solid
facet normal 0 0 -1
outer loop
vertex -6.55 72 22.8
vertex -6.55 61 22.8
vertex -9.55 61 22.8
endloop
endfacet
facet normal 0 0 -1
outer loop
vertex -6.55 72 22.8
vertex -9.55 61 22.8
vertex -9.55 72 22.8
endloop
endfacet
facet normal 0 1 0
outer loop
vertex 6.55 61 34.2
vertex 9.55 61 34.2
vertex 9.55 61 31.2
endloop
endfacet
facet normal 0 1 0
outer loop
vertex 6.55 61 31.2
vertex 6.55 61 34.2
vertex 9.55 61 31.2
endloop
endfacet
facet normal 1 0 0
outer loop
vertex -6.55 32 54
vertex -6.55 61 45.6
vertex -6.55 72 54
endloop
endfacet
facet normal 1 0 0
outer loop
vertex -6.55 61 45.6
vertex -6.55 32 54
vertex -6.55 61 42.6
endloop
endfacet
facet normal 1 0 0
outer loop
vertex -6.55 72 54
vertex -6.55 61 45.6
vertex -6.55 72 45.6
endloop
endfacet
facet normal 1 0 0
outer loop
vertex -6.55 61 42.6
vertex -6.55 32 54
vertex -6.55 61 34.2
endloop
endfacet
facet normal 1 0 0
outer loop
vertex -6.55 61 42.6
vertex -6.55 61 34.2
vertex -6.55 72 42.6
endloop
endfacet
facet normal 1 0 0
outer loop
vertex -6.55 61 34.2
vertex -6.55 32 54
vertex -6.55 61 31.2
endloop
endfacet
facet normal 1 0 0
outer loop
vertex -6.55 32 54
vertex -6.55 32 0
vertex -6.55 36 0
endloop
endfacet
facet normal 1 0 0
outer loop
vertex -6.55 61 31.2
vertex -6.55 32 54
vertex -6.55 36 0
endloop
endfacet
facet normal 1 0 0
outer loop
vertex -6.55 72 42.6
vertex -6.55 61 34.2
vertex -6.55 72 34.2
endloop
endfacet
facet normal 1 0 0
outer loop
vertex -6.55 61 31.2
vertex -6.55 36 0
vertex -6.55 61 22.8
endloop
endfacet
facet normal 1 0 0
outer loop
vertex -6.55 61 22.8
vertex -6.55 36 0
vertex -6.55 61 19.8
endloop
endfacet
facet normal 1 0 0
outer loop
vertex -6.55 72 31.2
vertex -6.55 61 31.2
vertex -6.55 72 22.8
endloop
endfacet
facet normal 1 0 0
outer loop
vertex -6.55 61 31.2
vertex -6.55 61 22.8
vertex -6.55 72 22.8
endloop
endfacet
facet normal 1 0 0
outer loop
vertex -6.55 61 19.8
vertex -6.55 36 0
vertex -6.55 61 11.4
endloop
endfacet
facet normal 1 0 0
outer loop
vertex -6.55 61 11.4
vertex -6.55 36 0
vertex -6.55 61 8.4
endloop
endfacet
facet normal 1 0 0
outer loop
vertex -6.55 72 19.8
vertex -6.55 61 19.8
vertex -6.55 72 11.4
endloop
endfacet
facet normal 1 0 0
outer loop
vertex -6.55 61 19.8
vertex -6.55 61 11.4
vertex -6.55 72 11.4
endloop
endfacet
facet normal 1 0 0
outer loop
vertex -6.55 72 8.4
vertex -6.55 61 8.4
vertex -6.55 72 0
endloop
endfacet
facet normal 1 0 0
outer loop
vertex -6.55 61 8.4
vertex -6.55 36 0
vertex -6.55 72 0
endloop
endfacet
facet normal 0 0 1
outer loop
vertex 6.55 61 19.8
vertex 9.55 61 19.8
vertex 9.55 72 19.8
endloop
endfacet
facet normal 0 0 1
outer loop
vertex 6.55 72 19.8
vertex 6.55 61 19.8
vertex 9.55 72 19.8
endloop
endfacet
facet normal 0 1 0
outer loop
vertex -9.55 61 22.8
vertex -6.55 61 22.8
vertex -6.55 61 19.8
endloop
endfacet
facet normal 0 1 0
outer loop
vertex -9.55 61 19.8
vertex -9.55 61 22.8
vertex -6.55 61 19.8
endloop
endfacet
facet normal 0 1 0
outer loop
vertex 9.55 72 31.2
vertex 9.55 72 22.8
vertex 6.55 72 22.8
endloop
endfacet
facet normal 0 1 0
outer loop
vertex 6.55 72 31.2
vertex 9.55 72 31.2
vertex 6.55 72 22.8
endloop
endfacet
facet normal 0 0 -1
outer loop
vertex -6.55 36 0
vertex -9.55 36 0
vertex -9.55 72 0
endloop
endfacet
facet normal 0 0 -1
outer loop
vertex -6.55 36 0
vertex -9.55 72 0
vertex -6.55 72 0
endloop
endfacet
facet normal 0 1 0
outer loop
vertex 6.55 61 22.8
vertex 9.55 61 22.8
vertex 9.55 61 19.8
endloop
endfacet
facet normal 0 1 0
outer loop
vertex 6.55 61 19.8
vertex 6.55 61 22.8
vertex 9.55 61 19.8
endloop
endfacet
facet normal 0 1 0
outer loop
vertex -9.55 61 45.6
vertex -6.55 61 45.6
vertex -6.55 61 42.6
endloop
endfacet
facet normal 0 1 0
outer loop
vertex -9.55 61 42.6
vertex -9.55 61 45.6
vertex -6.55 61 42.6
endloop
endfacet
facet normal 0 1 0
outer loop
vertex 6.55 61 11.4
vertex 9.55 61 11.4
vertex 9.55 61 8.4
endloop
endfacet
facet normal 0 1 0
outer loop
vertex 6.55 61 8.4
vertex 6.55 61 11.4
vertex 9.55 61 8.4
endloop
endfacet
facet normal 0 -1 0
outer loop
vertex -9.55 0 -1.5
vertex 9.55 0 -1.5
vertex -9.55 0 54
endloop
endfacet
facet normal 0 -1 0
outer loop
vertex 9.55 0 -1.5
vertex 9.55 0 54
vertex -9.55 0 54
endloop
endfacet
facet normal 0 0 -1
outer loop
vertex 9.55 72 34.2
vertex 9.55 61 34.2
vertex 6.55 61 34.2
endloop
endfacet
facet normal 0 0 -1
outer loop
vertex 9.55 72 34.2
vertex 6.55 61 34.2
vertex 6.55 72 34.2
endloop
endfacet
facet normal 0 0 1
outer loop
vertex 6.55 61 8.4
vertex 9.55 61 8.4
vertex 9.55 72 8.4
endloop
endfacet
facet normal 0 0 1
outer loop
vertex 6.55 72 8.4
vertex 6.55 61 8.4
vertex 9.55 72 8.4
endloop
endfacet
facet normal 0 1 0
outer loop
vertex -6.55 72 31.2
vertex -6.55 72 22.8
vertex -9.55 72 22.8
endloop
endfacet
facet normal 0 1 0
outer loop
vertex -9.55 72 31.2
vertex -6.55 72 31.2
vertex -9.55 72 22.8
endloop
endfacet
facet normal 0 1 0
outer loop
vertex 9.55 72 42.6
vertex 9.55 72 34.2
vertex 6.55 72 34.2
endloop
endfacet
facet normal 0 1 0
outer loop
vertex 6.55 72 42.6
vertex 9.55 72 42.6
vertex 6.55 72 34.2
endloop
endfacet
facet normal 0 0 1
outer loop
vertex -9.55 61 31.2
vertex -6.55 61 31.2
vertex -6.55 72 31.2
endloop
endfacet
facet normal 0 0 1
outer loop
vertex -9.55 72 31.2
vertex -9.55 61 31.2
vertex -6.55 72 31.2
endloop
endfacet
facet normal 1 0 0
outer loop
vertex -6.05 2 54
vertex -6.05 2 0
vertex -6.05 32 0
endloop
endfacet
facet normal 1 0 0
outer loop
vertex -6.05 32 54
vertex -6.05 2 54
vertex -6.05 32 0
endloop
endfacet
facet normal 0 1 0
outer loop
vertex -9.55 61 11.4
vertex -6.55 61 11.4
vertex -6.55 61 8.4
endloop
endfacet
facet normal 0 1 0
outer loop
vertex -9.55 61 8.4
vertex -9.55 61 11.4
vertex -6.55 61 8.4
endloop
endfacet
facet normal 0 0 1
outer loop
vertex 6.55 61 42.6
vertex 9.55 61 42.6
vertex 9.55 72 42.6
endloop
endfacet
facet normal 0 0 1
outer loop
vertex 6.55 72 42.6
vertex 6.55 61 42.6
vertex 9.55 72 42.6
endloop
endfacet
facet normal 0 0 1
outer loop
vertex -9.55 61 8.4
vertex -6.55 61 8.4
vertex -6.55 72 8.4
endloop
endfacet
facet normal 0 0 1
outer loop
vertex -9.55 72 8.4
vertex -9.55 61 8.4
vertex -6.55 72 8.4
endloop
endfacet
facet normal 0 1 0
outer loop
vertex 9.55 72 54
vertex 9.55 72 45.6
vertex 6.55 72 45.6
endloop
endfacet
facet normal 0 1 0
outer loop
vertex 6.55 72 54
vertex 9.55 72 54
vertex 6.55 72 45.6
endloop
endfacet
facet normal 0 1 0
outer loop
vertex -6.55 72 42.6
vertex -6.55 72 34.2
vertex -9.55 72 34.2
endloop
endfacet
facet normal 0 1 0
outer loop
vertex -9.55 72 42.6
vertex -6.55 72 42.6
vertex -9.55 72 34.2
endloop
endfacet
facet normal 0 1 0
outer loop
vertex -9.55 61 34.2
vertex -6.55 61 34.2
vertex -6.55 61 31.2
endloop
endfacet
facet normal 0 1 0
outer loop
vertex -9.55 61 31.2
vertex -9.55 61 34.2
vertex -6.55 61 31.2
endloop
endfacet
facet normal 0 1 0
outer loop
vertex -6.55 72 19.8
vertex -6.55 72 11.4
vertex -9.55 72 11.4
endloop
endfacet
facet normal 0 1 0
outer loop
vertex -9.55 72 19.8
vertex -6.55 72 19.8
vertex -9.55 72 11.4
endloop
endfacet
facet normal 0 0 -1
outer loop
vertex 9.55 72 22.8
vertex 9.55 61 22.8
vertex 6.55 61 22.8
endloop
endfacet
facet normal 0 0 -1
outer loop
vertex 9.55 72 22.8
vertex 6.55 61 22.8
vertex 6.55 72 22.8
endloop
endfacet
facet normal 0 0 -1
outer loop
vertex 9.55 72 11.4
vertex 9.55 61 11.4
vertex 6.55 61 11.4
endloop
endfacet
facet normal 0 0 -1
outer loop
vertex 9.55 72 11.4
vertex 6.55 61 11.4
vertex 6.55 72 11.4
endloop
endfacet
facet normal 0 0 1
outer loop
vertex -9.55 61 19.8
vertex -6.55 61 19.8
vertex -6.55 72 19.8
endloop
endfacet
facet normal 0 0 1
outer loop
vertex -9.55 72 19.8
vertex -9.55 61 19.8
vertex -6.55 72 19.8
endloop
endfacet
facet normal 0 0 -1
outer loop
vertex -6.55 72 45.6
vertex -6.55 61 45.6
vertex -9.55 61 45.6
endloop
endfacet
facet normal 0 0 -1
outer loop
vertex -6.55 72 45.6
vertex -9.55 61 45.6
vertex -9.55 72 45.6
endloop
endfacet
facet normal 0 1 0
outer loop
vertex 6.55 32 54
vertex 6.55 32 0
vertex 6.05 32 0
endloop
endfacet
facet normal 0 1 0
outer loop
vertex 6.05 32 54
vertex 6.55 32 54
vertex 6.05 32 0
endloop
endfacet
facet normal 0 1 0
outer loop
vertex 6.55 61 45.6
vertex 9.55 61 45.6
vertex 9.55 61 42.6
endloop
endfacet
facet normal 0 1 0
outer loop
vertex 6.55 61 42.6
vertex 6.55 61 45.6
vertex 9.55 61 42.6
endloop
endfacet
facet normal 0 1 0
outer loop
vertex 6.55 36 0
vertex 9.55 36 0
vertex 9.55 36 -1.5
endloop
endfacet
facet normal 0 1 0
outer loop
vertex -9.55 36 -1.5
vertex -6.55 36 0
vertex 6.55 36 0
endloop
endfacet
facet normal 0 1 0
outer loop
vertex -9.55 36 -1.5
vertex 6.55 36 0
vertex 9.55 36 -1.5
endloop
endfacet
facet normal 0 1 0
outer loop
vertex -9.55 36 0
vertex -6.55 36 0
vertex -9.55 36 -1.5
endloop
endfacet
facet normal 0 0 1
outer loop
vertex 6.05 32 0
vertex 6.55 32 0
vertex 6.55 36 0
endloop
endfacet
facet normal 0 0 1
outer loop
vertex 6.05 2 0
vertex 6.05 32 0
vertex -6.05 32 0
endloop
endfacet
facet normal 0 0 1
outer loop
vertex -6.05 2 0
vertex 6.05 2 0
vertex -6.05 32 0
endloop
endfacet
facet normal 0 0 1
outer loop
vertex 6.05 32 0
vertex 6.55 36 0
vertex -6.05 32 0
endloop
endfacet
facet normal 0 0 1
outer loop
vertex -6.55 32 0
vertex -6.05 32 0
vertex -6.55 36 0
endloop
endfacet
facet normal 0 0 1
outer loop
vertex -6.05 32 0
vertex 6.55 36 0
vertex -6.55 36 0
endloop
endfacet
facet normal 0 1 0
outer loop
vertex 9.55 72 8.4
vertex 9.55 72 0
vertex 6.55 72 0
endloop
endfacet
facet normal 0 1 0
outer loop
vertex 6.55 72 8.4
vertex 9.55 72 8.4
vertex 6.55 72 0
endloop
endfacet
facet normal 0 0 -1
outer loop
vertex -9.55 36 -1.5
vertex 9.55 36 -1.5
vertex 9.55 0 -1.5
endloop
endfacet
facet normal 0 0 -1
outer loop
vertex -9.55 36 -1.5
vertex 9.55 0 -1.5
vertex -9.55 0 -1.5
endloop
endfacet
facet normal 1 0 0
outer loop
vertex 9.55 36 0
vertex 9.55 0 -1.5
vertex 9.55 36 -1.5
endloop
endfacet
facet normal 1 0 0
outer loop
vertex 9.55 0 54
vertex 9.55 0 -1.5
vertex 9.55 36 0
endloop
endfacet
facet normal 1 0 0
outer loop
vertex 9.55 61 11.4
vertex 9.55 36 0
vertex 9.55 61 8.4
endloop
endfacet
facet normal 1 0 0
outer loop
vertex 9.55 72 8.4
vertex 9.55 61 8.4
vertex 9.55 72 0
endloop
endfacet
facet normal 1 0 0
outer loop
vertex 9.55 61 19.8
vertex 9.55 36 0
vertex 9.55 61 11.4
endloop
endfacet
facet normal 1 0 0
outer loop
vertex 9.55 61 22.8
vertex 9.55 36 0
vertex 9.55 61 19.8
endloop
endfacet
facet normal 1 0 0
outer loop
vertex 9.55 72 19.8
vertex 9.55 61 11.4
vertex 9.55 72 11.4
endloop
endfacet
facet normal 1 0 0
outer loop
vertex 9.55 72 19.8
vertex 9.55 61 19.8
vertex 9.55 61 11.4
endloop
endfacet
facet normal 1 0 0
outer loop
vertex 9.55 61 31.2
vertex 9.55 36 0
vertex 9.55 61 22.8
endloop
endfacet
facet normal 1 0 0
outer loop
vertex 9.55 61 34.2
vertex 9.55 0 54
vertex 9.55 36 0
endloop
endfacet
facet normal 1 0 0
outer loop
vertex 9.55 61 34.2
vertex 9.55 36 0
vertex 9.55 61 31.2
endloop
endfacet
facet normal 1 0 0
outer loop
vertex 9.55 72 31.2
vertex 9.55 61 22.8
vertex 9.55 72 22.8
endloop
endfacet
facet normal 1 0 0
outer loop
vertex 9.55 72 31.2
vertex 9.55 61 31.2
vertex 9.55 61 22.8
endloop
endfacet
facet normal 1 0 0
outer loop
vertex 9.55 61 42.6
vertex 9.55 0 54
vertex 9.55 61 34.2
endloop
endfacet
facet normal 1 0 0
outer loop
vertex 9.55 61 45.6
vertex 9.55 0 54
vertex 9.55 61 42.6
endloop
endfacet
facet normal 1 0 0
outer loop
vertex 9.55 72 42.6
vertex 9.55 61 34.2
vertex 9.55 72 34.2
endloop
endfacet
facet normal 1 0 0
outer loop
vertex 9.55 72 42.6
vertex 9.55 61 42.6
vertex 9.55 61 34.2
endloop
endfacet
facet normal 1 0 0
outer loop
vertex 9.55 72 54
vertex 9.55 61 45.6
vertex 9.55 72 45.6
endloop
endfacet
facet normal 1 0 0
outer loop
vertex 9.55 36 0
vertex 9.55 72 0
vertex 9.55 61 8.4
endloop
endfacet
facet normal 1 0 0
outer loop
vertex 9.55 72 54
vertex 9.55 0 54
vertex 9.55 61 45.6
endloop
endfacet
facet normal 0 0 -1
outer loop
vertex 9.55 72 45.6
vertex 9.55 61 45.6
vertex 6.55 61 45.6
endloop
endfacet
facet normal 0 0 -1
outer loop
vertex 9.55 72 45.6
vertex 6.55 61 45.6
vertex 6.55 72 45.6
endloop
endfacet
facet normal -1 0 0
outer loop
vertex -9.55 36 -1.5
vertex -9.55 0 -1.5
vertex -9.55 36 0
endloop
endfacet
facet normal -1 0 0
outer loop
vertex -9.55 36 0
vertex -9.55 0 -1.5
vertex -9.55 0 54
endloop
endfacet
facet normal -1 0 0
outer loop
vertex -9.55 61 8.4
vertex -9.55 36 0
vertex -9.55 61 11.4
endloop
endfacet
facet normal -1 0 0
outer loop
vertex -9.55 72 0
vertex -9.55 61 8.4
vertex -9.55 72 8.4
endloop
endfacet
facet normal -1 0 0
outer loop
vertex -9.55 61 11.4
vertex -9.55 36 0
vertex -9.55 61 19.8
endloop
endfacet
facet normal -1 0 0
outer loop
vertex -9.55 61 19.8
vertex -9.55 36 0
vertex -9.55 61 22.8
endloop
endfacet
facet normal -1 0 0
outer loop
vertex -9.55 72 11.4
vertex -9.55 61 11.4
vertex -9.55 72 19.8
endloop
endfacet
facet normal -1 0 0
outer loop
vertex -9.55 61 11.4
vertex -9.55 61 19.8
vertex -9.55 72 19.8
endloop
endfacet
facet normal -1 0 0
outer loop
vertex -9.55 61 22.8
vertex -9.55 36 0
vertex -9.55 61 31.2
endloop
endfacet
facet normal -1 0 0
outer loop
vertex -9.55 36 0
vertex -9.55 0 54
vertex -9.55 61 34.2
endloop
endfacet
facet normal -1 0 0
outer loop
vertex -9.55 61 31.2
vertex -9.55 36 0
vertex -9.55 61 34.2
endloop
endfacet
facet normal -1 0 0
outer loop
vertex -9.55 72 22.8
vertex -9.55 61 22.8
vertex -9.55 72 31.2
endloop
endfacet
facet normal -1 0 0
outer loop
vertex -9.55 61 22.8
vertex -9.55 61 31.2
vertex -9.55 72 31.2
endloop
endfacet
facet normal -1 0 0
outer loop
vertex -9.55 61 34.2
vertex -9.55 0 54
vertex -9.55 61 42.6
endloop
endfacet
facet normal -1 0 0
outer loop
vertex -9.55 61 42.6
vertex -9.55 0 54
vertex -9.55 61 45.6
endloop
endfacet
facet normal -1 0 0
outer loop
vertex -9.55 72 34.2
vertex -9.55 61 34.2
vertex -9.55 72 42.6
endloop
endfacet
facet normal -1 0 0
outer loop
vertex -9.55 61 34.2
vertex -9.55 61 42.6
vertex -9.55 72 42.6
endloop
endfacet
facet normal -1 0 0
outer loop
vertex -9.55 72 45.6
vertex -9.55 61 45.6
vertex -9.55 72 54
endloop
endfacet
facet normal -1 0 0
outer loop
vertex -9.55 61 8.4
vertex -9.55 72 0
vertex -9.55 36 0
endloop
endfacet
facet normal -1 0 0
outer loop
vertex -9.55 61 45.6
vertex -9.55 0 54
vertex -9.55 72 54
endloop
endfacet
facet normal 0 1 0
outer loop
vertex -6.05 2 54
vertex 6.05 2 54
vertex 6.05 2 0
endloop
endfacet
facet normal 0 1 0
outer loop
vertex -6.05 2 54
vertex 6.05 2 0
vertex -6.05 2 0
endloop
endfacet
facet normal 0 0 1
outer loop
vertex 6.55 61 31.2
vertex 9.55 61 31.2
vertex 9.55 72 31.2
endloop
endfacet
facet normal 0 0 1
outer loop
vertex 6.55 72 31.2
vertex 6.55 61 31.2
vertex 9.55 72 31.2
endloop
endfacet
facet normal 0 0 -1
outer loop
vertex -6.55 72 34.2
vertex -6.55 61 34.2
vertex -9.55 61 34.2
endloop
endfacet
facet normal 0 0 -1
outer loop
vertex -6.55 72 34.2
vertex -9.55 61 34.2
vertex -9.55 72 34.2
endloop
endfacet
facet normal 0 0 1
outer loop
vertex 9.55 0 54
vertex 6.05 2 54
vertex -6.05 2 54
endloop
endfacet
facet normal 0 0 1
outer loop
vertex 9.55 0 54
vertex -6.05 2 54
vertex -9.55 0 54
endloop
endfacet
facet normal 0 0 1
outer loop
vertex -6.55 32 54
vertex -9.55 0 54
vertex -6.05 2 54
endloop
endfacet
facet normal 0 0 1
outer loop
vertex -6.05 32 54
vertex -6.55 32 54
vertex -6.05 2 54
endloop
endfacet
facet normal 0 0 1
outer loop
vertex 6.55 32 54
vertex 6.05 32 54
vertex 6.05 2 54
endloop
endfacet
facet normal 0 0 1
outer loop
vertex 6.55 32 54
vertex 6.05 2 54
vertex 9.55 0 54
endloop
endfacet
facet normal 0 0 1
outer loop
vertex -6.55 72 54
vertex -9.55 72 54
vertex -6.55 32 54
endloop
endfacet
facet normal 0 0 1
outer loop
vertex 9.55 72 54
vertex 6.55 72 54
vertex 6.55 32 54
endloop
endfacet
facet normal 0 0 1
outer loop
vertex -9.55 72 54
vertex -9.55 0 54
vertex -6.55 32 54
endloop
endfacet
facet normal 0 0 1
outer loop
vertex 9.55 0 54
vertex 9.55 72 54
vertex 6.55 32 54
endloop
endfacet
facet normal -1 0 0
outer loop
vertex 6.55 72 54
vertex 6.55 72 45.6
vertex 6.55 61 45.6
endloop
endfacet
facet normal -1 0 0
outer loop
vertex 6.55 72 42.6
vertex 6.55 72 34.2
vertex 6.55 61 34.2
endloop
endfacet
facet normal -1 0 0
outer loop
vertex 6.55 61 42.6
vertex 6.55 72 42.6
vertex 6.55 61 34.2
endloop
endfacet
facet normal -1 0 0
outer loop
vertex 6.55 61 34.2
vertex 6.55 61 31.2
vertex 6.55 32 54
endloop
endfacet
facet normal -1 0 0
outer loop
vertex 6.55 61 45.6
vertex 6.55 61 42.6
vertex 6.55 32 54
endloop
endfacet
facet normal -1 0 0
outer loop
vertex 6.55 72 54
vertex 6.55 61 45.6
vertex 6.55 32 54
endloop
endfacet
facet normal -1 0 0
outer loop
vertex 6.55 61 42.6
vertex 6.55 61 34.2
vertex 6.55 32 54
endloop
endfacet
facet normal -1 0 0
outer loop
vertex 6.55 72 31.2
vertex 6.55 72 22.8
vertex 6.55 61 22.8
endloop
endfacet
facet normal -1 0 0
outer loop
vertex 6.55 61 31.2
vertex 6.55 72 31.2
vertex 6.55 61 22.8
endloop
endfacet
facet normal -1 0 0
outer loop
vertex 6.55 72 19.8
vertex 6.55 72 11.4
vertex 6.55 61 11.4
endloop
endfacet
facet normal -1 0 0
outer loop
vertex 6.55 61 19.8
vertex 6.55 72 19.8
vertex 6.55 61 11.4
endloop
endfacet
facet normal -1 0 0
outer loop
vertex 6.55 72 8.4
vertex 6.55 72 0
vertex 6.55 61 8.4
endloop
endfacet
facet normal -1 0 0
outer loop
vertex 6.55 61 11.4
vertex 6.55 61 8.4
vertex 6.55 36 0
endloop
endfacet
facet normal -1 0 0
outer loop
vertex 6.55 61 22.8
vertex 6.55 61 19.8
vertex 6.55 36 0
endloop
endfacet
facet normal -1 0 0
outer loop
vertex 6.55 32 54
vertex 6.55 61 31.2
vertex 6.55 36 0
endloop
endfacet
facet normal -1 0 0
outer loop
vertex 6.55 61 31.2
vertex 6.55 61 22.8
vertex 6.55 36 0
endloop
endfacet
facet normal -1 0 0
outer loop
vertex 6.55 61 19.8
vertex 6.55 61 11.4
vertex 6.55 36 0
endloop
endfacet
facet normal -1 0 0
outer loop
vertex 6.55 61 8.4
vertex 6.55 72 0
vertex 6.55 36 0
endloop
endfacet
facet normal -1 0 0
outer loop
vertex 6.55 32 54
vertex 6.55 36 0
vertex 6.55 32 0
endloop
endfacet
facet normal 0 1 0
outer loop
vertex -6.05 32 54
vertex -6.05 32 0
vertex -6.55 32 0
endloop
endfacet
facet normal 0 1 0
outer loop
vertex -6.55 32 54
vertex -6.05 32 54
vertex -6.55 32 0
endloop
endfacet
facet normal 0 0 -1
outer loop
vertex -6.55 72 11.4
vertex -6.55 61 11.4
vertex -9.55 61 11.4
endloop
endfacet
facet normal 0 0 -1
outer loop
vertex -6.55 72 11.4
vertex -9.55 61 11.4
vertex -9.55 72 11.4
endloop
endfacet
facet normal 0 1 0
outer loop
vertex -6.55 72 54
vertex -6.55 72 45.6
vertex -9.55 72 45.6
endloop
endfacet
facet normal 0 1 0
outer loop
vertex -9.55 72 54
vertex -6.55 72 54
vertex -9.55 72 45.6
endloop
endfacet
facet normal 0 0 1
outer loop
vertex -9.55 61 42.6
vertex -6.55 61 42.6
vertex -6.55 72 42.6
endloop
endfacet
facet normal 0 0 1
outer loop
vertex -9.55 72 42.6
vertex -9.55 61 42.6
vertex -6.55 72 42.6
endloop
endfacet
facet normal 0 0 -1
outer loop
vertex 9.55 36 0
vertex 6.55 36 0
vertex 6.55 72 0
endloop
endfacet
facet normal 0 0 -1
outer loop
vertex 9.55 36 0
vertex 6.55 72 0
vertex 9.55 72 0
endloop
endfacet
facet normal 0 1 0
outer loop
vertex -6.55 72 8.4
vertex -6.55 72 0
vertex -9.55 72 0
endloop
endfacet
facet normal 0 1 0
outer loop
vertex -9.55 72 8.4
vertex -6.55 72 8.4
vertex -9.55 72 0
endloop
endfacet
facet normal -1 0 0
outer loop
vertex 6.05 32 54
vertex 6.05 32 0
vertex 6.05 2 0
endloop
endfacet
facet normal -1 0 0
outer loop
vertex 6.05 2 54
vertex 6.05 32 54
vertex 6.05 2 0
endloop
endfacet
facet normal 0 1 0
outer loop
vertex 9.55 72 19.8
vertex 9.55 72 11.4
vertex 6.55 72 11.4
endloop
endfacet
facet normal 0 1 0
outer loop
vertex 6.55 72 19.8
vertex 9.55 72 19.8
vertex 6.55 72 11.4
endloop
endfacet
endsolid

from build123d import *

# Parameters (mm, degrees)
BOSS_EXTRUDE1_DEPTH = 54
SKETCH2_W           = 3
SKETCH2_H           = 11
CUT_EXTRUDE1_DEPTH  = 20.1
SKETCH3_W           = 19.1
SKETCH3_H           = 36
BOSS_EXTRUDE2_DEPTH = 1.5


with BuildPart() as part:
    # Sketch1 → Boss-Extrude1 (new body)
    with BuildSketch(Plane.XY):
        Polygon((-9.55, 72), (-9.55, 0), (9.55, 0), (9.55, 72), (6.55, 72), (6.55, 32), (6.05, 32), (6.05, 2), (-6.05, 2), (-6.05, 32), (-6.55, 32), (-6.55, 72), align=None)
    extrude(amount=BOSS_EXTRUDE1_DEPTH)

    # Sketch2 → Cut-Extrude1 (cut, through all)
    with BuildSketch(Plane(origin=(9.55, 0, 0), x_dir=(0, 0, -1), z_dir=(1, 0, 0))):
        with Locations((-44.1, 66.5)):
            Rectangle(SKETCH2_W, SKETCH2_H)
        with Locations((-32.7, 66.5)):
            Rectangle(SKETCH2_W, SKETCH2_H)
        with Locations((-21.3, 66.5)):
            Rectangle(SKETCH2_W, SKETCH2_H)
        with Locations((-9.9, 66.5)):
            Rectangle(SKETCH2_W, SKETCH2_H)
    extrude(amount=-CUT_EXTRUDE1_DEPTH, mode=Mode.SUBTRACT)

    # Sketch3 → Boss-Extrude2 (add)
    with BuildSketch(Plane(origin=(0, 0, 0), x_dir=(-1, 0, 0), z_dir=(0, 0, -1))):
        with Locations((0, 18)):
            Rectangle(SKETCH3_W, SKETCH3_H)
    extrude(amount=BOSS_EXTRUDE2_DEPTH)


solid = part.part
